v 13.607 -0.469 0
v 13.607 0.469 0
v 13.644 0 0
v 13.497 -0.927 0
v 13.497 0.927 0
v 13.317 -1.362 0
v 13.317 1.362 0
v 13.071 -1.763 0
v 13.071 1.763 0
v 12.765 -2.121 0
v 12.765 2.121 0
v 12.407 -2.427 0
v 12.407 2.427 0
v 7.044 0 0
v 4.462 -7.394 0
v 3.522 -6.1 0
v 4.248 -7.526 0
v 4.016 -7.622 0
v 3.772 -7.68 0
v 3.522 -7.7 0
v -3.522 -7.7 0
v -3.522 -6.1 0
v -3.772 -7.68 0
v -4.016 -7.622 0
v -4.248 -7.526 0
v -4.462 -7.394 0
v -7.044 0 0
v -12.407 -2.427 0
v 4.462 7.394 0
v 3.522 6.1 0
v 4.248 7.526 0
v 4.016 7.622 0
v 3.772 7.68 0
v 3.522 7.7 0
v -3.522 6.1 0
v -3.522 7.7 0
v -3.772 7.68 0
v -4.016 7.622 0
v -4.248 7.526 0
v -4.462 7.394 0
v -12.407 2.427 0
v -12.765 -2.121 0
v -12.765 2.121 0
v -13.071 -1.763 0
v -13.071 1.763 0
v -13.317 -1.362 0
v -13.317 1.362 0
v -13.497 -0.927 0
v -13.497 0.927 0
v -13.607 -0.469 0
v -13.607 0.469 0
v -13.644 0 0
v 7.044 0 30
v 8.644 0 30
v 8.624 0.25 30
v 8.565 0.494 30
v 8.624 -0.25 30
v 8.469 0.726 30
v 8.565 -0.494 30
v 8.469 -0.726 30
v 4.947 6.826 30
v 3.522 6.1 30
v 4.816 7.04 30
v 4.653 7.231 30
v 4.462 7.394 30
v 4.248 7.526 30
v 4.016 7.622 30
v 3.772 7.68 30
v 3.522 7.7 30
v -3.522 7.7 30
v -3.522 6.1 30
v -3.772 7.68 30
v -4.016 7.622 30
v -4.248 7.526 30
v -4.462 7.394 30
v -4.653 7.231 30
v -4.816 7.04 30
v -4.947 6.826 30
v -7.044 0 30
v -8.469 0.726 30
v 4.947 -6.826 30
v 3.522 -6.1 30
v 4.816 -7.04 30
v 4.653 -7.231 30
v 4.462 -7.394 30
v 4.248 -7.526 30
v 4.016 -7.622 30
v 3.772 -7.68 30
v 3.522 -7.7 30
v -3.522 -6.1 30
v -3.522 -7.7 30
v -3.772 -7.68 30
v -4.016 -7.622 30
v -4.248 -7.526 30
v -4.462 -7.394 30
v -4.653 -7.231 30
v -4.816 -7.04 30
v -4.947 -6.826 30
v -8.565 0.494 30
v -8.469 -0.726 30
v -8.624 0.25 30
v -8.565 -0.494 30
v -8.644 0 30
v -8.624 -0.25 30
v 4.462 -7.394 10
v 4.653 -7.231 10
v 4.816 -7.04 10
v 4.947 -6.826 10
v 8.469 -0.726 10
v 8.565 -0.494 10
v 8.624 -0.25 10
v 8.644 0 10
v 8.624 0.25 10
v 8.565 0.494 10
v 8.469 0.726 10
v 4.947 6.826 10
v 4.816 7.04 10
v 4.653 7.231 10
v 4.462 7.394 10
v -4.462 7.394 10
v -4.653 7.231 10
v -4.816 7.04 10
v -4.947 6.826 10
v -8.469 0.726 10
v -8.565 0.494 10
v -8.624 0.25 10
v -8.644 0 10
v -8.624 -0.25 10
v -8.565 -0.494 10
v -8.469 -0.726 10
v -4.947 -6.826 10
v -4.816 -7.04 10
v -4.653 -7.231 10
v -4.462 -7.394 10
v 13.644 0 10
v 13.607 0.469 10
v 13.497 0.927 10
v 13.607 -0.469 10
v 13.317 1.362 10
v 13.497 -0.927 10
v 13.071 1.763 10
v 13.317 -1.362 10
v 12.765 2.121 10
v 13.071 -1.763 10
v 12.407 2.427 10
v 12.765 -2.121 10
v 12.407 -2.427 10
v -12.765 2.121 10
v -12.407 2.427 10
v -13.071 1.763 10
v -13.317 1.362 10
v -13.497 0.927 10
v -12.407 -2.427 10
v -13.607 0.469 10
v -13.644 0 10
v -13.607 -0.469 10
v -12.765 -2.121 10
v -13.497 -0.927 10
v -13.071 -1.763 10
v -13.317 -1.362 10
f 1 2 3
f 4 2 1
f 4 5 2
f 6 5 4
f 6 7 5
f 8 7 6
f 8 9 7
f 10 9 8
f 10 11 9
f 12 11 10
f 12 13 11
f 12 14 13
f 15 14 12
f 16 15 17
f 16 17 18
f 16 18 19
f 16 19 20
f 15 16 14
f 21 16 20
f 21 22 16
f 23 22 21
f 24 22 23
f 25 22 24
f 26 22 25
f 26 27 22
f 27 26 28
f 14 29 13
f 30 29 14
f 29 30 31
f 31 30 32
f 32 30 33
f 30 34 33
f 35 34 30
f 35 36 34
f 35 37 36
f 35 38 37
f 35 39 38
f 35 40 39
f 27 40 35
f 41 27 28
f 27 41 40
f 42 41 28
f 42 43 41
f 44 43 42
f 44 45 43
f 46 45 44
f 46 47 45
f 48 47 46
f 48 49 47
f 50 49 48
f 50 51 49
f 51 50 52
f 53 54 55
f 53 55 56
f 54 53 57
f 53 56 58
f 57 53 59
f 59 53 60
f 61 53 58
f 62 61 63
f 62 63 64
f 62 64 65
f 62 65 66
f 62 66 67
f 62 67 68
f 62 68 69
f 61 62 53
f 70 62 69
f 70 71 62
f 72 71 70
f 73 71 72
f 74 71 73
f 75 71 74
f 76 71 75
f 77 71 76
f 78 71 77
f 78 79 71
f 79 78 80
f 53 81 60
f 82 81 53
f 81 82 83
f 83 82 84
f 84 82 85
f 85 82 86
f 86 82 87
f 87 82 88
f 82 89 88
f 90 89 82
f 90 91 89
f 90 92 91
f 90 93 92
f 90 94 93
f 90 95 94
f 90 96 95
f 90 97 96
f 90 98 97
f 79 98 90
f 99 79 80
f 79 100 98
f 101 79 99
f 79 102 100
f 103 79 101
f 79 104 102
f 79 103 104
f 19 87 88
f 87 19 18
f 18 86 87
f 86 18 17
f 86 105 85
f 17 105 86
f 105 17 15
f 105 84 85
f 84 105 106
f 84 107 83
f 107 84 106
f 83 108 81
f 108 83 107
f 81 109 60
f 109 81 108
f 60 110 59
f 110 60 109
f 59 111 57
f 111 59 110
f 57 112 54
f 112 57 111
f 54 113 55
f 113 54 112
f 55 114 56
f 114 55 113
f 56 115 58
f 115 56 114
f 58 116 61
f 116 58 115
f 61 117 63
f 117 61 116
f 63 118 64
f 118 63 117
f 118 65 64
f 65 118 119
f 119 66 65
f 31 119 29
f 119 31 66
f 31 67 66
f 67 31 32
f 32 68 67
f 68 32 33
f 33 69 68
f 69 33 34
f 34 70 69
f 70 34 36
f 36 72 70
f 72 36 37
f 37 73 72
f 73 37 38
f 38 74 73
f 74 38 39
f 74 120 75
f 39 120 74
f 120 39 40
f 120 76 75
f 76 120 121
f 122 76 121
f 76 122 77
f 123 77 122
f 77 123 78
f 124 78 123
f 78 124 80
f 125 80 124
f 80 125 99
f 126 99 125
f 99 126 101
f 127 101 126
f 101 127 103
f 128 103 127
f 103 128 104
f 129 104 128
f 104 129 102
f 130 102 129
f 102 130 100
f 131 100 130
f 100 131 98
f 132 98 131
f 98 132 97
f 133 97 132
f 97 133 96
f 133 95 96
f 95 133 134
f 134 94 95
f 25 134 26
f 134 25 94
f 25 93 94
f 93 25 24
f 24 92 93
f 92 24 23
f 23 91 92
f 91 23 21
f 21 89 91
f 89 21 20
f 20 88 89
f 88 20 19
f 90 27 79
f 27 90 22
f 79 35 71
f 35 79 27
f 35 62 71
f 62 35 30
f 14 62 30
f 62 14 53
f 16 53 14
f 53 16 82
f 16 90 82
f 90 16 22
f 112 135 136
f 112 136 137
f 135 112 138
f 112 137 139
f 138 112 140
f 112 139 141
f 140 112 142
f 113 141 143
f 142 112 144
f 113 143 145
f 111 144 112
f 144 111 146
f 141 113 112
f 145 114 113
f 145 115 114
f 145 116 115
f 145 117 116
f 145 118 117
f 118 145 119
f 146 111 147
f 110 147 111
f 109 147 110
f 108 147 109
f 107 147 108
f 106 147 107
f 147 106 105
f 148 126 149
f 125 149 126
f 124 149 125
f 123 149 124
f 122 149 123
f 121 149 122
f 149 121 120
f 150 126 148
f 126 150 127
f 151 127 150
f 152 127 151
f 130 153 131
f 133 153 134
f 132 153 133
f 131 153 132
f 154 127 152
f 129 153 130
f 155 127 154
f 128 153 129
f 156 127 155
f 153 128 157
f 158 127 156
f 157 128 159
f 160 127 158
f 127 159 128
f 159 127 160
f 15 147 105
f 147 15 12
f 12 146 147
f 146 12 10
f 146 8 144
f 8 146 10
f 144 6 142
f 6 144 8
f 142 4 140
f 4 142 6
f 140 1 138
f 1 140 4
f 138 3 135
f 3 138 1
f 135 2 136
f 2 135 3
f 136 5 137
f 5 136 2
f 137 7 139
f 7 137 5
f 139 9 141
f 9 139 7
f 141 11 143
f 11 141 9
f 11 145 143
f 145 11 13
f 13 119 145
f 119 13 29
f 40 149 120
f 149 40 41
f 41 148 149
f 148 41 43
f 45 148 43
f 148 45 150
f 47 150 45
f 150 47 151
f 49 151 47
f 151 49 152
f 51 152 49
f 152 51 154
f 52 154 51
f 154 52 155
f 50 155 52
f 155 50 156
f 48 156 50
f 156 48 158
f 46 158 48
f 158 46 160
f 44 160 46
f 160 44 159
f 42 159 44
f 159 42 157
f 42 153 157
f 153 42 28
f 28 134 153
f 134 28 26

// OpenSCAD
$fs = $preview ? 1 : 0.1;
$fa = $preview ? 3 : 2;

$nozzle = 0.4;

size = 12;
slop = 0.2;
height = 30;
wing_w = 5;
wing_h = 10;
wall = 4 * $nozzle;

// f = face-to-face distance
module hexagon(f) {
  circle(r = f / sqrt(3), $fn = 6);
}

module shaft(f, h, outer, wing_w=0, wing_r=3) {
  rh = f / sqrt(3);
  linear_extrude(h) {
    difference() {
      hull() {
        minkowski() {
          hexagon(f);
          circle(r = outer, $fn = 40);
        }
        if(wing_w > 0)
          for(i = [-1, 1])
            translate([i * (rh + outer + wing_w - wing_r), 0])
              circle(r = wing_r, $fn = 40);
      }
      hexagon(f);
    }
  }
}

shaft(f = size + slop, h = height, outer = wall);
shaft(f = size + slop, h = wing_h, outer = wall, wing_w = wing_w, wing_r = 3);
